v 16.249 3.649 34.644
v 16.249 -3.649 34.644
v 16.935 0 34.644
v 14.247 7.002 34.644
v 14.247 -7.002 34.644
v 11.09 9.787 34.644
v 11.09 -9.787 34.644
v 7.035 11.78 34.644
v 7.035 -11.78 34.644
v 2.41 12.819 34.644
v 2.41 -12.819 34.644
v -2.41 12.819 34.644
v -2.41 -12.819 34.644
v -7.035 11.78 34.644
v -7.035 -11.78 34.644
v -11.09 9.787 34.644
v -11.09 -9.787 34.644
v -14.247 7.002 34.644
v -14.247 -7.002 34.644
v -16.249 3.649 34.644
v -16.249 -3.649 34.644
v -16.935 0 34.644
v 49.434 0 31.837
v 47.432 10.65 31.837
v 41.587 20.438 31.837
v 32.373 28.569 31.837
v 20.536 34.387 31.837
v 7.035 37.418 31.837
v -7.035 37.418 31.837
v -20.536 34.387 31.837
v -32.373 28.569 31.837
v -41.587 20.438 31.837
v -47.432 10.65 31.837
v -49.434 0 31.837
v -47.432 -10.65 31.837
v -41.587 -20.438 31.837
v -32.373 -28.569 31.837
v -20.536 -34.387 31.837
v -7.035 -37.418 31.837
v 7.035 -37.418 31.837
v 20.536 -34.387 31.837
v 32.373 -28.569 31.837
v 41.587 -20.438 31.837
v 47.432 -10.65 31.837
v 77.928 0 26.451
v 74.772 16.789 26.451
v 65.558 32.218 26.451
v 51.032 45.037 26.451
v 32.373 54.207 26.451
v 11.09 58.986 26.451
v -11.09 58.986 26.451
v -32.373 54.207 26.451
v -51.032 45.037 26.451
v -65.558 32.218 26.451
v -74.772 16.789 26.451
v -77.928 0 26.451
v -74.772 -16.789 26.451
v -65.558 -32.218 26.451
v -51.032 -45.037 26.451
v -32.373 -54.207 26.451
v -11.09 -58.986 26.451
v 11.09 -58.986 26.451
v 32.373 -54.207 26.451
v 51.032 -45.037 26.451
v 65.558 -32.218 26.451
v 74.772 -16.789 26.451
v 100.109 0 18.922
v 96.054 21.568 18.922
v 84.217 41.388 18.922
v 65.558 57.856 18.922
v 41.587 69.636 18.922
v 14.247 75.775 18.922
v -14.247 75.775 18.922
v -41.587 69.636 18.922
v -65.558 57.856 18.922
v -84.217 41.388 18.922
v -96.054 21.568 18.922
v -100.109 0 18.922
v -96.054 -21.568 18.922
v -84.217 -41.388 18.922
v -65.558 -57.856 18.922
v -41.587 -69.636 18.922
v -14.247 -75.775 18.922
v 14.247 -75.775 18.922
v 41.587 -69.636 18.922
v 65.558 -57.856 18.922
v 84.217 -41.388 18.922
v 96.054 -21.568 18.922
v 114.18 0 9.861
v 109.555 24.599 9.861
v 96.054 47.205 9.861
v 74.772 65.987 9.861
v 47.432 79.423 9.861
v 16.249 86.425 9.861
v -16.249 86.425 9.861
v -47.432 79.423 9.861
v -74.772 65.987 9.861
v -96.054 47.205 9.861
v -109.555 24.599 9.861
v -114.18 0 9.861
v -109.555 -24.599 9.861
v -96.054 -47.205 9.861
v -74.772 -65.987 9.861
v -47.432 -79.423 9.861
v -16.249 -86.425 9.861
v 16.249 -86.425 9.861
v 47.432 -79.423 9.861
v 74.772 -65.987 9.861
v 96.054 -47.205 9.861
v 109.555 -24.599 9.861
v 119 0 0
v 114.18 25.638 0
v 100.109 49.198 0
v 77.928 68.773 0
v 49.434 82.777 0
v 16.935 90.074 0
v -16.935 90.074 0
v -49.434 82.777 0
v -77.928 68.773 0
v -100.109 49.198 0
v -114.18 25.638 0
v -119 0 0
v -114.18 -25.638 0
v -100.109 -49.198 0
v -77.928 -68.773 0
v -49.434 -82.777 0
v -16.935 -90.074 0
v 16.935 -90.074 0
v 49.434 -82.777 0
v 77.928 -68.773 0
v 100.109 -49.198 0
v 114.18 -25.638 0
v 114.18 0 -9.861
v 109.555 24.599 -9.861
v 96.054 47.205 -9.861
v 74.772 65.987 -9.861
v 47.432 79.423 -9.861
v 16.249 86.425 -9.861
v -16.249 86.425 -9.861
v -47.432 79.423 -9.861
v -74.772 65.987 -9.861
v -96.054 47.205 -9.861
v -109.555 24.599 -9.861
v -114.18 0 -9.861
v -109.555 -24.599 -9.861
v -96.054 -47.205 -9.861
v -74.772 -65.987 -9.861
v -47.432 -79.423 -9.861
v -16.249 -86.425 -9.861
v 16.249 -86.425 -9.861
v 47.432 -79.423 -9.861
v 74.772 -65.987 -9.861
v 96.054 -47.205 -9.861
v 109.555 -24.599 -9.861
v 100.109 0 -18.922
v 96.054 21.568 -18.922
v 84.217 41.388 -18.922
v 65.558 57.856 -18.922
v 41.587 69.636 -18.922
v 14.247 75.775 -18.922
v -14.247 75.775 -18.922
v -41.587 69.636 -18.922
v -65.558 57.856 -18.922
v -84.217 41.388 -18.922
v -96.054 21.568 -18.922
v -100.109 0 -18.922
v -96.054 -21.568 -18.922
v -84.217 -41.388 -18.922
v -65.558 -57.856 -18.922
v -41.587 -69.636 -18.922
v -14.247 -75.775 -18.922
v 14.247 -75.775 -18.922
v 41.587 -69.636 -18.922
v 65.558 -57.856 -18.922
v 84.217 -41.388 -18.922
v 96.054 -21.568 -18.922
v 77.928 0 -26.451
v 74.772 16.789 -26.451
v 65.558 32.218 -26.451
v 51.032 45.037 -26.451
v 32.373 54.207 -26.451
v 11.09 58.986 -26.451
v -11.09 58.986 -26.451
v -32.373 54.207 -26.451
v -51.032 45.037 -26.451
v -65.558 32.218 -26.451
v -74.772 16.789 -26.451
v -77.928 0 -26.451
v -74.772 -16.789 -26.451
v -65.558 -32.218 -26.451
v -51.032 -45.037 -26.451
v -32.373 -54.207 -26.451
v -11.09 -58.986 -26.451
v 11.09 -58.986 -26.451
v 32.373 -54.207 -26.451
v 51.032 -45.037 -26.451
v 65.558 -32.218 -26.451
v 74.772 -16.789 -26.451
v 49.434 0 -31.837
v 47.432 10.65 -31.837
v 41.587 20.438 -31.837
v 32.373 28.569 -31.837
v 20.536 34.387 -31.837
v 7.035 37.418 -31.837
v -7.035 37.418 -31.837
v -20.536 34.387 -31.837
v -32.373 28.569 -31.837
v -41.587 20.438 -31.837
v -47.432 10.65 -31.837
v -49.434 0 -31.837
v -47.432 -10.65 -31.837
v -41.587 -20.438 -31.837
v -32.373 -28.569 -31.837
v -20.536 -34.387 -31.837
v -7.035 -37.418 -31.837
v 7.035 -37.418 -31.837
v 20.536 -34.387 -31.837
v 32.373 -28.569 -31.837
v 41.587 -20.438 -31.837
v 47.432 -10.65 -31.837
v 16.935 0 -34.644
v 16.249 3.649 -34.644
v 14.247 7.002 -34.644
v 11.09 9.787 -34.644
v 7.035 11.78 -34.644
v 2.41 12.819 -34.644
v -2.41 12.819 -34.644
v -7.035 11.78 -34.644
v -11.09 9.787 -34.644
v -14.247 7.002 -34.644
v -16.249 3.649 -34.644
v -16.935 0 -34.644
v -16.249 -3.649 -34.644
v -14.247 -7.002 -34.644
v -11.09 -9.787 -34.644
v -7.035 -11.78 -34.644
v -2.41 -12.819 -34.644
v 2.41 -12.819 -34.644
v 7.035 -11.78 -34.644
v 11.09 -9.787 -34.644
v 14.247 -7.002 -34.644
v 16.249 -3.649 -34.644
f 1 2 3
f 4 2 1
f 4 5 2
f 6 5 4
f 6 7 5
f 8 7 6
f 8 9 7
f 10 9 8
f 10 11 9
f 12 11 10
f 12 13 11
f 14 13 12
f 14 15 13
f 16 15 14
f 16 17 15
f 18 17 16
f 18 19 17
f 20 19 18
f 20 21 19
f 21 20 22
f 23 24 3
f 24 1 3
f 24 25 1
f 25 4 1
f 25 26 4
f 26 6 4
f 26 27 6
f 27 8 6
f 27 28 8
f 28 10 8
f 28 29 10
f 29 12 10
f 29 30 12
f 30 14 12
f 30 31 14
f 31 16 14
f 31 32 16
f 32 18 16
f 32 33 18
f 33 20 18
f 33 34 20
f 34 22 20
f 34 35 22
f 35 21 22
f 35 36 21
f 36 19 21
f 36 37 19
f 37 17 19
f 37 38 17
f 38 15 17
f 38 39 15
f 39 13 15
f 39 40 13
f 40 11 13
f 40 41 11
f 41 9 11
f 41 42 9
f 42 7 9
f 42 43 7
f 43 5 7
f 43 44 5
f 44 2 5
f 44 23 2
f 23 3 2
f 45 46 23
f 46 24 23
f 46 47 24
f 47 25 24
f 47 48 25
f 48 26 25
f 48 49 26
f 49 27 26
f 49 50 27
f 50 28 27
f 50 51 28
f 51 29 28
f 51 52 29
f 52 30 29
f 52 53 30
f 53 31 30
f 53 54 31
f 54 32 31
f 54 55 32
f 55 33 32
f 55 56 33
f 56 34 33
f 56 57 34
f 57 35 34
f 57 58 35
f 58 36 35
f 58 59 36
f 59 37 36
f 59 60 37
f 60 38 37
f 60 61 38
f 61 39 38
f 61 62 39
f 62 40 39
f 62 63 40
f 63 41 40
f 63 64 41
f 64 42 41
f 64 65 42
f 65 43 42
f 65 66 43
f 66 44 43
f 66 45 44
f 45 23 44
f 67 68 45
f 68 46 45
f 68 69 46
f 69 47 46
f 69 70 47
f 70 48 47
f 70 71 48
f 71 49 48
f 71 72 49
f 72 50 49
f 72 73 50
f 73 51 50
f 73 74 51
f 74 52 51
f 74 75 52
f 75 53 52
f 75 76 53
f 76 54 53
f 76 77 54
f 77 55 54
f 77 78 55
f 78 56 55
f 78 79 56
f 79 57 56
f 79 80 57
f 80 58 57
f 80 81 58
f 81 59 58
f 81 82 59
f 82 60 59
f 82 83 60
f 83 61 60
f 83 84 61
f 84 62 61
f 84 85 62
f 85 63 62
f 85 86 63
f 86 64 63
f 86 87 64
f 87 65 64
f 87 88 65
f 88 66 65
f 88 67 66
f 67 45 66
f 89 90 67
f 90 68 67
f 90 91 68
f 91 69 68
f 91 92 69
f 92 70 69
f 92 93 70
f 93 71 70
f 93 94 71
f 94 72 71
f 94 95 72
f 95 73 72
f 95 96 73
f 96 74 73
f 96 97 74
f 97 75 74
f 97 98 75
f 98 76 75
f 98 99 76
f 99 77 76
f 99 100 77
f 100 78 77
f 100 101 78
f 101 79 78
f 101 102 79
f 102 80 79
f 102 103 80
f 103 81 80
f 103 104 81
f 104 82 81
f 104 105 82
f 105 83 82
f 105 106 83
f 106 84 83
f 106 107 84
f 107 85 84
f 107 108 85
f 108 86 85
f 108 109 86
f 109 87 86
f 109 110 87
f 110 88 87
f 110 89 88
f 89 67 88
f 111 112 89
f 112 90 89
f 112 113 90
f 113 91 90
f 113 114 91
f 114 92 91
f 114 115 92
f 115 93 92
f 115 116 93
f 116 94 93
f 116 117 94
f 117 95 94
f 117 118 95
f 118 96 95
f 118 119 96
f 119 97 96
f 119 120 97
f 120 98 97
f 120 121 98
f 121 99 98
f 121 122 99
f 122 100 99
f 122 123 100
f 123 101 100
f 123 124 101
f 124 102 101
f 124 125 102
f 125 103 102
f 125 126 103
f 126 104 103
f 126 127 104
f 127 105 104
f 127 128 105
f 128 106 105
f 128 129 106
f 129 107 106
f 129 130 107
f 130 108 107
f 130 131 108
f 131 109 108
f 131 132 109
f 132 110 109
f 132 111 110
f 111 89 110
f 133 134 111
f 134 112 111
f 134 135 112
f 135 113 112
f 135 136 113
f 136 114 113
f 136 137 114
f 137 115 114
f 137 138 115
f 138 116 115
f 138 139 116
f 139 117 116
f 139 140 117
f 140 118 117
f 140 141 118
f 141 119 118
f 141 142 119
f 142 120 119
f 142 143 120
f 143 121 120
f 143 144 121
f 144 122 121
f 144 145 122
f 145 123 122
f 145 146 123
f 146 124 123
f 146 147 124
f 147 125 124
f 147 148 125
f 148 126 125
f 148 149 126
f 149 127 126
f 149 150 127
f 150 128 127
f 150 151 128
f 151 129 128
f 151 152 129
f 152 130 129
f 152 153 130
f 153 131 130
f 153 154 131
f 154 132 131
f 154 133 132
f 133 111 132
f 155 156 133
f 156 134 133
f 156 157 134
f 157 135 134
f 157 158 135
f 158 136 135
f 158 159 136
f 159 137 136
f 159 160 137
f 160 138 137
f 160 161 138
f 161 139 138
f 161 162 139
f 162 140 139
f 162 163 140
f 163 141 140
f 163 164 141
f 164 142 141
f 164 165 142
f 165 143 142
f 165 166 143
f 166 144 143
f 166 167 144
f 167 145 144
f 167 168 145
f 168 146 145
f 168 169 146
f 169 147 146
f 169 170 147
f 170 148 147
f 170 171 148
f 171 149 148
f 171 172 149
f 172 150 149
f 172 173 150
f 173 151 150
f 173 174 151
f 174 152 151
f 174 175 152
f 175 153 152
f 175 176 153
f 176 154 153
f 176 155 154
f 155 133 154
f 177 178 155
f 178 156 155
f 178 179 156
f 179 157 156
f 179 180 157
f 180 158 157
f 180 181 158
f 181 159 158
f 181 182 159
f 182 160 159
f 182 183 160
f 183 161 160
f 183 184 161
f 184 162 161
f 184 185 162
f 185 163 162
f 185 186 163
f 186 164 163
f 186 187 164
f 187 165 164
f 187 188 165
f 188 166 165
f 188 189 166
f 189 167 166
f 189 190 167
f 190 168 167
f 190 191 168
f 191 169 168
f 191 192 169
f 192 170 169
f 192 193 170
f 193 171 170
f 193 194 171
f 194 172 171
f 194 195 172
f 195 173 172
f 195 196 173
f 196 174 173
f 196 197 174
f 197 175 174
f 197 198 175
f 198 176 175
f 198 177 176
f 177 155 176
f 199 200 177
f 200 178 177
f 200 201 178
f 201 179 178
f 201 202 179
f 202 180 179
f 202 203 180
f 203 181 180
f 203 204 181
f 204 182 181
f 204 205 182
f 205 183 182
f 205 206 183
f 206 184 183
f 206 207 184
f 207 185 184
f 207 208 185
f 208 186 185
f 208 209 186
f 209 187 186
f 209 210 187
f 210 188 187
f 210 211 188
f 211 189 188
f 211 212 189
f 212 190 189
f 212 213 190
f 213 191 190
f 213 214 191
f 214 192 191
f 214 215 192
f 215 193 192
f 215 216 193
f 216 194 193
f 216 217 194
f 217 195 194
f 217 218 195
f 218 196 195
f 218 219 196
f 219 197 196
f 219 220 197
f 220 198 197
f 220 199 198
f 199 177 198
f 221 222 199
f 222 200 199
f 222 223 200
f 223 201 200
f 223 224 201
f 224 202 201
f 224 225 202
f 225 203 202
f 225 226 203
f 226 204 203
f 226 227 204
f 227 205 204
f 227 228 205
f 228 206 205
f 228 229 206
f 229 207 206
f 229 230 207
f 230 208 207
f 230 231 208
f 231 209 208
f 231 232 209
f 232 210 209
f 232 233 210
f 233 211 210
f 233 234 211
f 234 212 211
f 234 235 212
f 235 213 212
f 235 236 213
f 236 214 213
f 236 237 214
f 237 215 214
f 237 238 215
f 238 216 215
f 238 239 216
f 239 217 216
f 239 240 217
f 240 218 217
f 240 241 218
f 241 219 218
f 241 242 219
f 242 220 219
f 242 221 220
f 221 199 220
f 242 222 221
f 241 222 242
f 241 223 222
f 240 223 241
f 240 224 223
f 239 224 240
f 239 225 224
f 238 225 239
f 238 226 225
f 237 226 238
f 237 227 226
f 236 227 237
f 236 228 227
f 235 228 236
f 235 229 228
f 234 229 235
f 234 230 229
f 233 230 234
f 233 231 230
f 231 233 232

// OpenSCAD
// Generated by SolidPython 1.0.1 on 2020-07-29 00:46:53


scale(v = [17, 13, 5]) {
	sphere(r = 7);
}
/***********************************************
*********      SolidPython code:      **********
************************************************
 
# import packages: SolidPython
from solid import *
from solid.utils import *
from itertools import chain, combinations, permutations


class Resize:

    def __init__(self, scad_file):
        self.scad_file = scad_file
        #self.scad_file = import_scad(scad_file)
        # cone/cylinder param:
        self.r1 = 0
        self.r2 = 0
        self.h = 0
        # rectangular prism param:
        self.w = 0
        self.l = 0
        # ellipse param:
        self.r = 0

    # import OpenScad code (file name corresponds to shape)


    # classify shape + parameters
    def assign(self, param1, param2, param3):
        if self.scad_file == 'cone.scad':
            self.r1 = param1
            self.r2 = param2
            self.h = param3
        elif self.scad_file == 'cylinder.scad':
            self.r1 = param1
            self.r2 = param2
            self.h = param3
        elif self.scad_file == 'rectangularPrism.scad':
            self.h = param1
            self.l = param2
            self.w = param3
        else:
            self.r = param1
            self.h = param2

    # resize parameters
    def iterate(self):
        x = range(3, 20, 2)
        i = 1
        if self.scad_file == 'cone.scad':
            tempList = list(permutations(x, 2))
            for temp in tempList:
                param1 = temp[0]
                param2 = temp[1]
                filepath = 'produced_scad_files/' + 'cone' + str(param1) + '_' + str(param2) + '_' + '.scad'
                scad_render_to_file(cylinder(h=param1, r1=param2, r2=0), filepath)

        elif self.scad_file == 'cylinder.scad':
            tempList = list(permutations(x, 3))
            for temp in tempList:
                param1 = temp[0]
                param2 = temp[1]
                filepath = 'produced_scad_files/' + 'cylinder' + str(param1) + '_' + str(param2) + '_' + '.scad'
                scad_render_to_file(cylinder(h=param1, r1=param2, r2=param2), filepath)

        elif self.scad_file == 'rectangularPrism.scad':
            tempList = list(permutations(x, 3))
            for temp in tempList:
                param1 = temp[0]
                param2 = temp[1]
                param3 = temp[2]
                filepath = 'produced_scad_files/' + 'rectangularPrism' + str(param1) + '_' + str(param2) + '_' + str(
                    param3) + '.scad'
                scad_render_to_file(cube(size=(param1, param2, param3)), filepath)

        elif self.scad_file == 'ellipse.scad':
            tempList = list(permutations(x, 4))
            for temp in tempList:
                param1 = temp[0]
                param2 = temp[1]
                param3 = temp[2]
                param4 = temp[3]
                filepath = 'produced_scad_files/' + 'ellipse' + str(param1) + '_' + str(param2) + '_' + str(param3) + '_' + str(param4) + '.scad'
                scad_render_to_file(scale([param1, param2, param3])(sphere(r=param4)), filepath)

    def render_to_scadfile(self):
        scad_render_to_file(scad, 'example.scad') 
 
************************************************/
